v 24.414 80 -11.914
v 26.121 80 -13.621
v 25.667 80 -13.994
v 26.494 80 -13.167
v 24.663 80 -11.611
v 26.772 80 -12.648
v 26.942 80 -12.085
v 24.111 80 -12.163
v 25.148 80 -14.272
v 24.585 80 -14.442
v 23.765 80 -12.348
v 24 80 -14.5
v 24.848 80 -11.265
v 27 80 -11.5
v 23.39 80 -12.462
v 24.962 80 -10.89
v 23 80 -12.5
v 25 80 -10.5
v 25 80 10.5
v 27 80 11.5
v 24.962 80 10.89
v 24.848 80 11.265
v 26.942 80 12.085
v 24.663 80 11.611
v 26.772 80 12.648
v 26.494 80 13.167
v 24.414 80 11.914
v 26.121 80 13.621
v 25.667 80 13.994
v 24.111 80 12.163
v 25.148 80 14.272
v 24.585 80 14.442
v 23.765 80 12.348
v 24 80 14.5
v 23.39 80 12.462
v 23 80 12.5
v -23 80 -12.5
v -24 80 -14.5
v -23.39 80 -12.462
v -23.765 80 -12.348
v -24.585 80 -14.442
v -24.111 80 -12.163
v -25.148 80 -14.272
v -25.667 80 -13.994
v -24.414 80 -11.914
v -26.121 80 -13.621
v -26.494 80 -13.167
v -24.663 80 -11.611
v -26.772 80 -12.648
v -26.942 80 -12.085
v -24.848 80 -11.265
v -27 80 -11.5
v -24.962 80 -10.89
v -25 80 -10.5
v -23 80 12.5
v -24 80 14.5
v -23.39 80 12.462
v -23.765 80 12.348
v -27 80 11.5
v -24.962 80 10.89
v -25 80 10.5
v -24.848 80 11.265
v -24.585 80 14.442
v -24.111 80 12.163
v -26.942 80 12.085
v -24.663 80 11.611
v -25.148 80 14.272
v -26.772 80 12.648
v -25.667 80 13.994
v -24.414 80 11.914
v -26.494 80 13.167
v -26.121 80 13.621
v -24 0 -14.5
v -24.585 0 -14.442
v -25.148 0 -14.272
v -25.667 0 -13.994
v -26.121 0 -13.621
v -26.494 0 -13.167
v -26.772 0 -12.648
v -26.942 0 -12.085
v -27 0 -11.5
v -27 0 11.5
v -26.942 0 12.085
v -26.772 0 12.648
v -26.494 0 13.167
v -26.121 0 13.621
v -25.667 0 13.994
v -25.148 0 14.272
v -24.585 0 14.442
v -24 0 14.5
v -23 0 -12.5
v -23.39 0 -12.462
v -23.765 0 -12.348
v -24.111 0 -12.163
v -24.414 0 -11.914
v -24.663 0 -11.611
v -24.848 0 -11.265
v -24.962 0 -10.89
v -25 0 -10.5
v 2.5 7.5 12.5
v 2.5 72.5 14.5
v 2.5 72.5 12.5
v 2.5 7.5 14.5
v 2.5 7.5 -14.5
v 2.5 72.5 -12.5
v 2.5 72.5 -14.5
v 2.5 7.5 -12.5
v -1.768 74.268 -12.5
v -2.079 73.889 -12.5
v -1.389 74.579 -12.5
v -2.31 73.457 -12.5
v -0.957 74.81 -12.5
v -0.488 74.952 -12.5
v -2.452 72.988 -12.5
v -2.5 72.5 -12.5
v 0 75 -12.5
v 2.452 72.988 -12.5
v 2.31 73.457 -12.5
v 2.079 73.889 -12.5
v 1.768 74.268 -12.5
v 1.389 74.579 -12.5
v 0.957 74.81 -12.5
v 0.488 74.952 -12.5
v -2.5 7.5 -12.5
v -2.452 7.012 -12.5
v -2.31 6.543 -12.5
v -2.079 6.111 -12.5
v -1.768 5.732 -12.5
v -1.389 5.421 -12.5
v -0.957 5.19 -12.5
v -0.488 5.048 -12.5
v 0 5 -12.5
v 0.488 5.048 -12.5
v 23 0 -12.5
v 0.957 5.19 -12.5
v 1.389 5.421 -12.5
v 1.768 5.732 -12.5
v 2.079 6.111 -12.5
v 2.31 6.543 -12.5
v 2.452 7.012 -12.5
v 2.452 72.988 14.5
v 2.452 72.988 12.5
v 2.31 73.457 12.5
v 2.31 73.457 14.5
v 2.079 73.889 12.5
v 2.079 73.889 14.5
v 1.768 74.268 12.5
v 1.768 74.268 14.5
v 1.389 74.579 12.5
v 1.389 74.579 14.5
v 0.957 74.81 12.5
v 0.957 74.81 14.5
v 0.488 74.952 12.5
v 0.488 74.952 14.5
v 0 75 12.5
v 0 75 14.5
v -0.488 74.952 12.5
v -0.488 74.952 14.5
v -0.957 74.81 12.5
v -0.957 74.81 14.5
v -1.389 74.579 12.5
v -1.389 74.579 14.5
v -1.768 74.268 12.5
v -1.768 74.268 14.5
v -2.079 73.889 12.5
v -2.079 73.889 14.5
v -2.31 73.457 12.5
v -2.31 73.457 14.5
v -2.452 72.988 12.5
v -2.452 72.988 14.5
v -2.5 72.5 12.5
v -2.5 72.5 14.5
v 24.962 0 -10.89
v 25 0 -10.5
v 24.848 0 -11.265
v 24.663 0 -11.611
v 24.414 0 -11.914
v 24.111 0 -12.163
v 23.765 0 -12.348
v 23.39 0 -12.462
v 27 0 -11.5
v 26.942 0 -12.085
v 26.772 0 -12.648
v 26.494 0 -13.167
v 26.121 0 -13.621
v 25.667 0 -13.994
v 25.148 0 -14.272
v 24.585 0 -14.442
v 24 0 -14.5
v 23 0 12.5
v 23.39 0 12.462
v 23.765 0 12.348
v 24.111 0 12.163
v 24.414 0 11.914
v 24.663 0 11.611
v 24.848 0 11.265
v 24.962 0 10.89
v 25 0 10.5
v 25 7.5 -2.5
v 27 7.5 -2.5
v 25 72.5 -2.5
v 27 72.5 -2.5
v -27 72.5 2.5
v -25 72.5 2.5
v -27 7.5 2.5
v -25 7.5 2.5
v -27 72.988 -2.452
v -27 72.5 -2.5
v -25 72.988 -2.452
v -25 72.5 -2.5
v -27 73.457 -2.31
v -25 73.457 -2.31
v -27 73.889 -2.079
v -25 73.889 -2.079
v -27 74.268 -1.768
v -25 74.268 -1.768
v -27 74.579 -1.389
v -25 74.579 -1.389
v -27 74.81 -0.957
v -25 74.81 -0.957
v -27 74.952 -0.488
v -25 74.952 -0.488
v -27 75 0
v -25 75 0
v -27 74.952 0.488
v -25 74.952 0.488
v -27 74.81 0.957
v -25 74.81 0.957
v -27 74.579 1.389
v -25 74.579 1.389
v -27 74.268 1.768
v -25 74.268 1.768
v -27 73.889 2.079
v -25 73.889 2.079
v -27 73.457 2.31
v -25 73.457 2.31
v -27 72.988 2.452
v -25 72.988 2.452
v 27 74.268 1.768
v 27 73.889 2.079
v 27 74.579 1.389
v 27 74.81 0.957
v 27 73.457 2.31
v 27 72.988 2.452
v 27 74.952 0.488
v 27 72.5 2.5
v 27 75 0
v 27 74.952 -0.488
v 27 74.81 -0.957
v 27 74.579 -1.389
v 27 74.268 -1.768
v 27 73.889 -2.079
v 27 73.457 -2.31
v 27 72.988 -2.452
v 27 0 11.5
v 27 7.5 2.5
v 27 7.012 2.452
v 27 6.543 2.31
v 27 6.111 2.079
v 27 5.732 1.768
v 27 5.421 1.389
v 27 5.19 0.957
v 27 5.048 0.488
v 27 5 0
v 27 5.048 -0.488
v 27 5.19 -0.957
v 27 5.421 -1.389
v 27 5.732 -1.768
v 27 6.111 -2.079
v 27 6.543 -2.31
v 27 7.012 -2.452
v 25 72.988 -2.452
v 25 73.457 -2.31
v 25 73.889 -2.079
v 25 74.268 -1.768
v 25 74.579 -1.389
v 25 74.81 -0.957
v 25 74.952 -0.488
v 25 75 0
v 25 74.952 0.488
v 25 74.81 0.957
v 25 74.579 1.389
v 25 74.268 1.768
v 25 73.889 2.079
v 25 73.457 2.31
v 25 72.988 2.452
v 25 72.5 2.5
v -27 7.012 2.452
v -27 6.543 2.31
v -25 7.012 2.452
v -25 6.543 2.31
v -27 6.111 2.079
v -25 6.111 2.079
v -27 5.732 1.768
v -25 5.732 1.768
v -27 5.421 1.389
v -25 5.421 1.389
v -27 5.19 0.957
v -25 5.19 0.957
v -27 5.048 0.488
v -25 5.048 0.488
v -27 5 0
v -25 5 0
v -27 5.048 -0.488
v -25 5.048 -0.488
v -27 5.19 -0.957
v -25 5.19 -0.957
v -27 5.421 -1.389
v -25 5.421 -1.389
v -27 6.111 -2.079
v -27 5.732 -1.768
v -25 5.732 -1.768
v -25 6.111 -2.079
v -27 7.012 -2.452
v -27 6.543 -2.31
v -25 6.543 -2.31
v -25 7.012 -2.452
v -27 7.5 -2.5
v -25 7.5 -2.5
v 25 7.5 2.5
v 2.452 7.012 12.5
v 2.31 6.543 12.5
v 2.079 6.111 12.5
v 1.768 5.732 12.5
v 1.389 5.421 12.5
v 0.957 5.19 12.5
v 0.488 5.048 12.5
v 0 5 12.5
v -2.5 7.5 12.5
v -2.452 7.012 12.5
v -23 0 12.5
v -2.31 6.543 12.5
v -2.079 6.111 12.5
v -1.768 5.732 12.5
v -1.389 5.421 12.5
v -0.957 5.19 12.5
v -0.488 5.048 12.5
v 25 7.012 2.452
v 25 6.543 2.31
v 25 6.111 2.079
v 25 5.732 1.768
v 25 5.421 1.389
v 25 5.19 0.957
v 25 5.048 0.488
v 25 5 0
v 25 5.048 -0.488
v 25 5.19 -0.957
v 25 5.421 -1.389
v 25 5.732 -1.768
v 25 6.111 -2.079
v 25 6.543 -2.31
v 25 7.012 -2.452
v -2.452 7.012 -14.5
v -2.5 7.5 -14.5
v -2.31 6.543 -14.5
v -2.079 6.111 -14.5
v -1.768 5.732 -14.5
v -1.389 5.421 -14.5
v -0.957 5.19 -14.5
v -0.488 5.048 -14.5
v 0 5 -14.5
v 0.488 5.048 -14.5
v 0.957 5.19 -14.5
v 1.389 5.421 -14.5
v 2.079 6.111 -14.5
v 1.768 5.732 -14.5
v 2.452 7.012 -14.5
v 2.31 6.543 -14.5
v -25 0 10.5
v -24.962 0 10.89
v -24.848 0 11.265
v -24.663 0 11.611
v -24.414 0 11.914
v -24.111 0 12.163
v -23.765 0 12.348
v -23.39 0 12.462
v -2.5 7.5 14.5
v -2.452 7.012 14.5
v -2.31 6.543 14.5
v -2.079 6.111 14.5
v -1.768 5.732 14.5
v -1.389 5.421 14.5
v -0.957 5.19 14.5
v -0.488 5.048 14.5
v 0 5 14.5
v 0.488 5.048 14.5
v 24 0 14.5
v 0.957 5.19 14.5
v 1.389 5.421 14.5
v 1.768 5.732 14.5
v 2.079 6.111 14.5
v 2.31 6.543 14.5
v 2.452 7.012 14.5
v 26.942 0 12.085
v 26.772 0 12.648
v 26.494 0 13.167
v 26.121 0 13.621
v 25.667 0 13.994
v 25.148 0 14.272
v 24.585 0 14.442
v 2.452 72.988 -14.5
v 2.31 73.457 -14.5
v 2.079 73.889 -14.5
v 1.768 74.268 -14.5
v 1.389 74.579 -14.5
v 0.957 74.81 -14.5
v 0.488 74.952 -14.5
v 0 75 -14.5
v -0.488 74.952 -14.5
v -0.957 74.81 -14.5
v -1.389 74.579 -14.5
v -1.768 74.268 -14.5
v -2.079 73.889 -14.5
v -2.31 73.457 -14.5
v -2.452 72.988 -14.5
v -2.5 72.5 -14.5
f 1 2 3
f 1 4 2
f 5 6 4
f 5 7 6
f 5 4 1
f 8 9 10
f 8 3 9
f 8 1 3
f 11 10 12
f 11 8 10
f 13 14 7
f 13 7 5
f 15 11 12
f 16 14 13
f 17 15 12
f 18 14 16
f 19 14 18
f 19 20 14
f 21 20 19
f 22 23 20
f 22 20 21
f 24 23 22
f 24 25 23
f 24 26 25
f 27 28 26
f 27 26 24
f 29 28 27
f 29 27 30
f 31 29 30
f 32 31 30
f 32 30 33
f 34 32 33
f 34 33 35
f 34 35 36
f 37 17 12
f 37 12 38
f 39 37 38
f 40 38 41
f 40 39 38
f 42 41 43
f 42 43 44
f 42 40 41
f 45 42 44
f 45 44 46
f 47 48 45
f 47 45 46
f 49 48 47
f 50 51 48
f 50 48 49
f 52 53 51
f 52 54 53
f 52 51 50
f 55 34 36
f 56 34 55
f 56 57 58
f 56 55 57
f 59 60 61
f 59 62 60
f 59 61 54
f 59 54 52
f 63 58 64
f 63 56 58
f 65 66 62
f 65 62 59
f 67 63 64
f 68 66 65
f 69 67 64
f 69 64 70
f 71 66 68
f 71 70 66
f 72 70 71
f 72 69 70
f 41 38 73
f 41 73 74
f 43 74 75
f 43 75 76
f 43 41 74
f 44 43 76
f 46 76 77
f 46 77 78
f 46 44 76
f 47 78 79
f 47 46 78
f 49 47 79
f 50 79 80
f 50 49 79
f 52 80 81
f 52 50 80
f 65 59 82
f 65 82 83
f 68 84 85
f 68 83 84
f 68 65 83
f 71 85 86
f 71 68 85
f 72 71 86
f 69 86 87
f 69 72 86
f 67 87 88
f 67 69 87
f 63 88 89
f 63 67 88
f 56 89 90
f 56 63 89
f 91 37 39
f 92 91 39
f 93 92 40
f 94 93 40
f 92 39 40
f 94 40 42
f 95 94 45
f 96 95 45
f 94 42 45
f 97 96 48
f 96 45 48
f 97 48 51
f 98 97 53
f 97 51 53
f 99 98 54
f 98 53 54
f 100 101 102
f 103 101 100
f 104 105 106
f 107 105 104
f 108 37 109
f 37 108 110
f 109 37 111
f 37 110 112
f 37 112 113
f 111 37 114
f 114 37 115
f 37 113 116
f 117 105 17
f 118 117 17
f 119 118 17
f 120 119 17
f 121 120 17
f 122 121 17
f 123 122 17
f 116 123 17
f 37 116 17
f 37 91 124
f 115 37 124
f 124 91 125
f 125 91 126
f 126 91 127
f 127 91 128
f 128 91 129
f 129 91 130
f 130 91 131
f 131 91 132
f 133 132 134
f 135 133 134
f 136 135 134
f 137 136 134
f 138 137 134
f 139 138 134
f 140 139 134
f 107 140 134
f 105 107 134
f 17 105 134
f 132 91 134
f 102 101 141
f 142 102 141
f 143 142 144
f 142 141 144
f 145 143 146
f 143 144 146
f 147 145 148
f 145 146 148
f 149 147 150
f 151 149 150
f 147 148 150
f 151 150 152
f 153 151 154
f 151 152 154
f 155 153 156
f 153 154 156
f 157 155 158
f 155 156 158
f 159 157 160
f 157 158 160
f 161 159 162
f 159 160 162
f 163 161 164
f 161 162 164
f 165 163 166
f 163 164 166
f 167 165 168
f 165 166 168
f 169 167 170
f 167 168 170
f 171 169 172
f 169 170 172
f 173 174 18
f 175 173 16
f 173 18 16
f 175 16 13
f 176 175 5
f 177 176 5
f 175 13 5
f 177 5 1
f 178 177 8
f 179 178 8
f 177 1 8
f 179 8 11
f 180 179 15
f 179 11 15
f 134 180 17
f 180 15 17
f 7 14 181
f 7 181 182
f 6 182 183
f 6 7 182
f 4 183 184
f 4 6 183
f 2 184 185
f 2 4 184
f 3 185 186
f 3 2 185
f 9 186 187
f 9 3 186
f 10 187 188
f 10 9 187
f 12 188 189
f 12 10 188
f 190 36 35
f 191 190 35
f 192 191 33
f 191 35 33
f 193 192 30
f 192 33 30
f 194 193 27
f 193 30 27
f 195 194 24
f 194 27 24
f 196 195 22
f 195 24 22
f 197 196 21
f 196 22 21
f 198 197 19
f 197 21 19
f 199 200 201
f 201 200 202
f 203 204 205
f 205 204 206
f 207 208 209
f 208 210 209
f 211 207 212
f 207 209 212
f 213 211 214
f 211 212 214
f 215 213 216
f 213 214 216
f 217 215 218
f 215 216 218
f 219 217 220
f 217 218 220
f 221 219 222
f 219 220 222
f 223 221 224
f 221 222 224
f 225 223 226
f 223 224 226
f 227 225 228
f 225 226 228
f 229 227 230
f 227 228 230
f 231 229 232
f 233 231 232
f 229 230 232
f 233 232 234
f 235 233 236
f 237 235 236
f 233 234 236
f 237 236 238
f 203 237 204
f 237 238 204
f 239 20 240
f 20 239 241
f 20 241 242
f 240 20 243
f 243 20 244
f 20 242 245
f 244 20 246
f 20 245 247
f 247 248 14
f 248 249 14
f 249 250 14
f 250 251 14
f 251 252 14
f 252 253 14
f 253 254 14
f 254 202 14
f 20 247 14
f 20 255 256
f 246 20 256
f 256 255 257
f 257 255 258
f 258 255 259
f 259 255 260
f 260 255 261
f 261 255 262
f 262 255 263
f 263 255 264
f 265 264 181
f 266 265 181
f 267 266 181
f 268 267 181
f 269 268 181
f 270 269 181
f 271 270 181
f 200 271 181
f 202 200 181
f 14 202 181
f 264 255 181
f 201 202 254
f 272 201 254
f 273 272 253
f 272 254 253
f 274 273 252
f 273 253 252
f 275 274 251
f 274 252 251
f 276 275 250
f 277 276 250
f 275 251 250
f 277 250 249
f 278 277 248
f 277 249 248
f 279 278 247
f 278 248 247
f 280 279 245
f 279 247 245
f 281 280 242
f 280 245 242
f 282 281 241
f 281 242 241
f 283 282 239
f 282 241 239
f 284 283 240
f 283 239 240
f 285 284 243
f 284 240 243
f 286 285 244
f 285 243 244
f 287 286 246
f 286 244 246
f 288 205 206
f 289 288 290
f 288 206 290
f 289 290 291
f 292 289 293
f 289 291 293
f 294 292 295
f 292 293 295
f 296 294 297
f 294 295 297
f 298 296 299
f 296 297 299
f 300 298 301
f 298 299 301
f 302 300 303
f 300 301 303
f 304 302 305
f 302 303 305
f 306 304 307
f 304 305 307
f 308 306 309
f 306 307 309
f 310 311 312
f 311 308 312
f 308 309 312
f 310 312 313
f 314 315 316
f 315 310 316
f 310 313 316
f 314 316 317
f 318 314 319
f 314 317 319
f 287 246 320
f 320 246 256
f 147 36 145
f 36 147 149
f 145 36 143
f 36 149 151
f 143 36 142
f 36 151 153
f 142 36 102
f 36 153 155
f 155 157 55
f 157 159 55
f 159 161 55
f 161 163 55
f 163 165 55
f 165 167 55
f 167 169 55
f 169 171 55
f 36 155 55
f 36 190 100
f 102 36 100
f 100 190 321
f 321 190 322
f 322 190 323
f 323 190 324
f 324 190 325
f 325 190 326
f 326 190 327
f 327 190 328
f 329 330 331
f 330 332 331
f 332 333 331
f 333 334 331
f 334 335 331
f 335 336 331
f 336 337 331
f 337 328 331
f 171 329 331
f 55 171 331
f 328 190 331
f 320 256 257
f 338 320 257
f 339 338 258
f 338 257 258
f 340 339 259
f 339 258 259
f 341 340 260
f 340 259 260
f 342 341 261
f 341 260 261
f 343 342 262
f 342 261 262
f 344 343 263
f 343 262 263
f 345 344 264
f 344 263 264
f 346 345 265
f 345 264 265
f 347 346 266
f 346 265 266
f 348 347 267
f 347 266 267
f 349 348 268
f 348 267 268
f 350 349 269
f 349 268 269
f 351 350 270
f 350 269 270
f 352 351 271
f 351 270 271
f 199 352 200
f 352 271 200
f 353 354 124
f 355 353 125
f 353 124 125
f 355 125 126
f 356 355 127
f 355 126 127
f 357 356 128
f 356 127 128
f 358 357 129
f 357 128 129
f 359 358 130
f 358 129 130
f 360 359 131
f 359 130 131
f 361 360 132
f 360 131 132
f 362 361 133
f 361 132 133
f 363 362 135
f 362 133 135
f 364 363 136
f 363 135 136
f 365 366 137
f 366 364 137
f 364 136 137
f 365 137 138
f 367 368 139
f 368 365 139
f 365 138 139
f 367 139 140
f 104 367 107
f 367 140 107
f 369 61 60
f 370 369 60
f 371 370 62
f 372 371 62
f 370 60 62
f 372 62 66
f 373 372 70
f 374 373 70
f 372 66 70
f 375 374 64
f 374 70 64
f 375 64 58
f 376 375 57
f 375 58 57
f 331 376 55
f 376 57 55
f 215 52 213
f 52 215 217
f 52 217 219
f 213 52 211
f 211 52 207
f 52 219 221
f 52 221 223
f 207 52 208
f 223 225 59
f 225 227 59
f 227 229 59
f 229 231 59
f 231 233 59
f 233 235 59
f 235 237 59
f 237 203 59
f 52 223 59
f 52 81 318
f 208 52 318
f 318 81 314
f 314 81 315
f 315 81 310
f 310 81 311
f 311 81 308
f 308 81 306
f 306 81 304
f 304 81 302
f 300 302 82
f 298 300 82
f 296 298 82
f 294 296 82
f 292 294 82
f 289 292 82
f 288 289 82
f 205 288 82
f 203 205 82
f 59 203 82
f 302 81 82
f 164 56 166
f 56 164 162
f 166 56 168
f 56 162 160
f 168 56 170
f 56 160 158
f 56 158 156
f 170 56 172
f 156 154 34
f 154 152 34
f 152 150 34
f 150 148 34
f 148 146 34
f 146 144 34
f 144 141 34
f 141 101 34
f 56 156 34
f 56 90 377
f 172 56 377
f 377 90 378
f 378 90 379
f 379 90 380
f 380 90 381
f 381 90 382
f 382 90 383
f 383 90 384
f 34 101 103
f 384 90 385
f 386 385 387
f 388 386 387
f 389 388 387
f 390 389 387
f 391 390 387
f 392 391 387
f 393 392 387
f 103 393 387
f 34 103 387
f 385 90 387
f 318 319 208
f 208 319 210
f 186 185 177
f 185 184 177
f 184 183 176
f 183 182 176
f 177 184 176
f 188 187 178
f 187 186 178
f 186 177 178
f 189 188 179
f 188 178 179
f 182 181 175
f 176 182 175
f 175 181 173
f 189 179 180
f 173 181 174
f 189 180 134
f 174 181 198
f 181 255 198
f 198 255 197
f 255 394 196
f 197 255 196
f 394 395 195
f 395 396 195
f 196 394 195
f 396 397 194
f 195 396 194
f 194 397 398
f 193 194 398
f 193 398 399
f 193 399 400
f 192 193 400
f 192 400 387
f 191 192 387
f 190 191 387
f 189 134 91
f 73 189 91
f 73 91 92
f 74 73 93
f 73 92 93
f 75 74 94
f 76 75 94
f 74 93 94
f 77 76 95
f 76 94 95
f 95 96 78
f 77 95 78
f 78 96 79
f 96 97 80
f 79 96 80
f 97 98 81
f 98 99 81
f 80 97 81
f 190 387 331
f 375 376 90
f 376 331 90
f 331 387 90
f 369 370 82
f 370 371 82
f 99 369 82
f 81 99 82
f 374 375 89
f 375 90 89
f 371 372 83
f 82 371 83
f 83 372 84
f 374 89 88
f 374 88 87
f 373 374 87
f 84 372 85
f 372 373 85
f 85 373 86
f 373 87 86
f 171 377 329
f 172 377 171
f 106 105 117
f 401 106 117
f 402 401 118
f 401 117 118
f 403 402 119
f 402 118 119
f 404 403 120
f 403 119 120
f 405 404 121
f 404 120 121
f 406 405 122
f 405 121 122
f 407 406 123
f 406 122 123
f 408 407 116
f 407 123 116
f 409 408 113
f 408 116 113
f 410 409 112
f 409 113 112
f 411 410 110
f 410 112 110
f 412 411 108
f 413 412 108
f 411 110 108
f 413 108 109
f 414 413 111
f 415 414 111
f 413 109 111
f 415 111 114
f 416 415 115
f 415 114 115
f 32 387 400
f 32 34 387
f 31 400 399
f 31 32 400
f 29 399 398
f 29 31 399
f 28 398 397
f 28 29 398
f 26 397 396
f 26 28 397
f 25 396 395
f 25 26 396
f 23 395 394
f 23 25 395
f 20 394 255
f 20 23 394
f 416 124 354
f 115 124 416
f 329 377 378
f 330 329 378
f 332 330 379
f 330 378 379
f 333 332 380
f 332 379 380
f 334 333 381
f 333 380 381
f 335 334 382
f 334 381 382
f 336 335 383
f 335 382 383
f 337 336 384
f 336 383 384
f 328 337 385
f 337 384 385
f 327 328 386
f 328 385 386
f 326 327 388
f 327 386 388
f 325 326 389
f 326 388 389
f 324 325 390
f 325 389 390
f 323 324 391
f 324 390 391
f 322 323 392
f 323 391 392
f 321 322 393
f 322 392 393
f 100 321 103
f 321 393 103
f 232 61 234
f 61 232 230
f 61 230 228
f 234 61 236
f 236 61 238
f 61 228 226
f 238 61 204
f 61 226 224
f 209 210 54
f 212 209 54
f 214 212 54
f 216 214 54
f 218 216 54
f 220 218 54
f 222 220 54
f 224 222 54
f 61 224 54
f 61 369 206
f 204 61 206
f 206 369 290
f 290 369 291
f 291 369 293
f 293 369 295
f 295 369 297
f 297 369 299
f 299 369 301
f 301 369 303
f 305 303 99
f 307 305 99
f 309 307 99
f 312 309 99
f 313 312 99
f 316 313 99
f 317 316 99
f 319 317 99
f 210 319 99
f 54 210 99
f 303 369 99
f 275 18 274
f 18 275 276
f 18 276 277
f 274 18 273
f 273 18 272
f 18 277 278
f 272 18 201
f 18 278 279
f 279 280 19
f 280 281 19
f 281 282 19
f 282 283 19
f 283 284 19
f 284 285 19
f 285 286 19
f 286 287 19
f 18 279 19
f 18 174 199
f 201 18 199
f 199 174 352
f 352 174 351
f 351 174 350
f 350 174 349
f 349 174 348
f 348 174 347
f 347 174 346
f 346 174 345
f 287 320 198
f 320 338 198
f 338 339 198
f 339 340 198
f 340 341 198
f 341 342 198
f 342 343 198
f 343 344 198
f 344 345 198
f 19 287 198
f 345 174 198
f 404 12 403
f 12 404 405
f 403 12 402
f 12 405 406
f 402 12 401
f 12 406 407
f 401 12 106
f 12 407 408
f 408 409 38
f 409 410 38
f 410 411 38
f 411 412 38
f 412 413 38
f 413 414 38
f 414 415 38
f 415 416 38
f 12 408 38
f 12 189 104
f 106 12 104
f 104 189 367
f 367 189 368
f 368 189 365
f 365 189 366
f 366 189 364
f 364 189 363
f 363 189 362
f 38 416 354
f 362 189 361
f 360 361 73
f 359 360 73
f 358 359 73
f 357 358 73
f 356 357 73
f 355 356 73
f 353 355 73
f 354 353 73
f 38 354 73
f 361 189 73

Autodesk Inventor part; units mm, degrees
ref_plane "YZ Plane" through (0, 0, 0) normal (1, 0, 0) x (0, 1, 0)
ref_plane "XZ Plane" through (0, 0, 0) normal (0, 1, 0) x (-1, 0, 0)
ref_plane "XY Plane" through (0, 0, 0) normal (0, 0, 1) x (1, 0, 0)
sketch "Sketch1" plane through (0, 0, 0) normal (0, 1, 0) x (-1, 0, 0)
  line L0 (-25, 12.5) -> (25, 12.5)
  line L1 (25, 12.5) -> (25, -12.5)
  line L2 (25, -12.5) -> (-25, -12.5)
  line L3 (-25, -12.5) -> (-25, 12.5)
  line L4 (-25, 12.5) -> (25, -12.5) construction
  line L5 (25, 12.5) -> (-25, -12.5) construction
  line L6 (27, -14.5) -> (27, 14.5)
  line L7 (27, 14.5) -> (-27, 14.5)
  line L8 (-27, 14.5) -> (-27, -14.5)
  line L9 (-27, -14.5) -> (27, -14.5)
  point P0 (0, 0)
  dimension "d0" = 50
  dimension "d1" = 25
  dimension "d2" = 2
extrude "Extrusion1" add sketch "Sketch1" along normal blind 80
sketch "Sketch2" plane through (-27, 0, 14.5) normal (0, 0, 1) x (1, 0, 0)
  line L0 (0, 80) -> (54, 80) projected
  line L1 (27, 80) -> (27, 0)
  line L2 (24.5, 5) -> (24.5, 75)
  line L3 (24.5, 75) -> (29.5, 75)
  line L4 (29.5, 75) -> (29.5, 5)
  line L5 (29.5, 5) -> (24.5, 5)
  line L6 (24.5, 5) -> (29.5, 75) construction
  line L7 (24.5, 75) -> (29.5, 5) construction
  line L8 (0, 0) -> (0, 80) projected
  arc A0 (29.5, 72.5) -> (24.5, 72.5) centre (27, 72.5) ccw
  arc A1 (24.5, 7.5) -> (29.5, 7.5) centre (27, 7.5) ccw
  point P0 (27, 40)
  dimension "d5" = 5
  dimension "d6" = 5
extrude "Extrusion2" cut sketch "Sketch2" against normal up to surface (29 mm away) contours A0 L4 A1 L1 | L1 A1 L2 A0
sketch "Sketch3" plane through (27, 0, 14.5) normal (1, 0, 0) x (0, 0, -1)
  line L0 (0, 80) -> (29, 80) projected
  line L1 (14.5, 80) -> (14.5, 0)
  line L2 (27, 0) -> (2, 0) projected
  line L3 (17, 5) -> (17, 75)
  line L4 (17, 75) -> (12, 75)
  line L5 (12, 75) -> (12, 5)
  line L6 (12, 5) -> (17, 5)
  line L7 (17, 5) -> (12, 75) construction
  line L8 (17, 75) -> (12, 5) construction
  line L9 (0, 0) -> (0, 80) projected
  arc A0 (17, 72.5) -> (12, 72.5) centre (14.5, 72.5) ccw
  arc A1 (12, 7.5) -> (17, 7.5) centre (14.5, 7.5) ccw
  point P0 (14.5, 40)
  dimension "d9" = 5
  dimension "d10" = 5
extrude "Extrusion3" cut sketch "Sketch3" against normal up to surface (54 mm away) contours A0 L3 A1 L1 | L1 A1 L5 A0
fillet "Fillet1" radius 2 4 edges at (-25, 40, -12.5) (-25, 40, 12.5) (25, 40, 12.5) (25, 40, -12.5)
fillet "Fillet2" radius 3 4 edges at (27, 40, 14.5) (27, 40, -14.5) (-27, 40, -14.5) (-27, 40, 14.5)
properties part number "magazine-tower"
